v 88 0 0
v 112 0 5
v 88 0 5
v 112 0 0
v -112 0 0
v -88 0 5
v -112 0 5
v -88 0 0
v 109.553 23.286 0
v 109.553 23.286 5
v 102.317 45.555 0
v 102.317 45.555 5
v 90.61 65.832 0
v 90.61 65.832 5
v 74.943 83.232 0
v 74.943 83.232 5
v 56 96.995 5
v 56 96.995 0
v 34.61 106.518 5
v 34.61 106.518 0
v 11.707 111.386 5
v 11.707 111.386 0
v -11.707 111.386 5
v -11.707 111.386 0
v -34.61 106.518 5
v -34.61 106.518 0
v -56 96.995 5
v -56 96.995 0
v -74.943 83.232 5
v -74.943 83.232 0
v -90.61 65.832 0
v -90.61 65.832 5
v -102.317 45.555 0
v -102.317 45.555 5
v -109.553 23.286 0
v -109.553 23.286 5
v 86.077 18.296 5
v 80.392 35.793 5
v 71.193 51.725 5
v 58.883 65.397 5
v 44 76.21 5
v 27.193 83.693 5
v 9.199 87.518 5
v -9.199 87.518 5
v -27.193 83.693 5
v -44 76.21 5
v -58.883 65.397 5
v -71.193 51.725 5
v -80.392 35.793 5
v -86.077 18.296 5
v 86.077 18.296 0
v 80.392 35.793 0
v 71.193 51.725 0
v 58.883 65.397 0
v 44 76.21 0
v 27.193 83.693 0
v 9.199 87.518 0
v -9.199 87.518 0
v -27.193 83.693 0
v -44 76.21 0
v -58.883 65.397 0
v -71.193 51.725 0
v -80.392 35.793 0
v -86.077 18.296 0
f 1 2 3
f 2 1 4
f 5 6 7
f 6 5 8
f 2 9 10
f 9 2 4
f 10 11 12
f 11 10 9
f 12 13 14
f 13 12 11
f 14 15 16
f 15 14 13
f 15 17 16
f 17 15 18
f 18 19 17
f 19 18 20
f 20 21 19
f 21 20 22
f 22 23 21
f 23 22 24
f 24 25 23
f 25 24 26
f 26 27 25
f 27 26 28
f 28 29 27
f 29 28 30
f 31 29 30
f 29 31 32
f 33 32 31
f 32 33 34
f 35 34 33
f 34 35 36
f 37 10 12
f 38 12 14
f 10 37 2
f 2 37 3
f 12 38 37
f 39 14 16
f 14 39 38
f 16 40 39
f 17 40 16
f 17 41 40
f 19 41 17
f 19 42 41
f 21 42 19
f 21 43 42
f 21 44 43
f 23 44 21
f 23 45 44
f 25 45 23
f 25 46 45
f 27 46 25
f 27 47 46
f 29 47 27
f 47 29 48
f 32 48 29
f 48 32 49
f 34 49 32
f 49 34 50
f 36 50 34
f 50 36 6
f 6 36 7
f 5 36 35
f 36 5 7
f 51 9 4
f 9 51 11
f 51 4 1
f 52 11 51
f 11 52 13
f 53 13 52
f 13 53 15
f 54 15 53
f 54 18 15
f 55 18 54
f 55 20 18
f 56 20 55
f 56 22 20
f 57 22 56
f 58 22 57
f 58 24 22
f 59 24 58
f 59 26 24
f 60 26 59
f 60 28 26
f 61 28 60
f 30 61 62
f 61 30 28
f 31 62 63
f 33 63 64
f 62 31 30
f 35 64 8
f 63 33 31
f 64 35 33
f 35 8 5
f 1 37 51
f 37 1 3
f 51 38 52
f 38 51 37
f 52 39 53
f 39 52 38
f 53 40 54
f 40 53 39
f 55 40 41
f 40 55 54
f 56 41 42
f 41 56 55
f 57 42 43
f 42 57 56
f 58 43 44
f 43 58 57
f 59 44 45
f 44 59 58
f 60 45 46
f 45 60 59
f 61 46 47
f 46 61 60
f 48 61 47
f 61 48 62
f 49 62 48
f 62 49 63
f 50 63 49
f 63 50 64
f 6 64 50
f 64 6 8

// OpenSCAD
color("black")
  segment(110, 2);

color("red")
  segment(100);

color("orange")
  segment(90);

color("black")
  segment(90 - 2, 2);

module segment(radius, width = 10) {
  rotate_extrude(angle = 180)
    translate([radius, 0, 0])
      square([width, 5]);
}
